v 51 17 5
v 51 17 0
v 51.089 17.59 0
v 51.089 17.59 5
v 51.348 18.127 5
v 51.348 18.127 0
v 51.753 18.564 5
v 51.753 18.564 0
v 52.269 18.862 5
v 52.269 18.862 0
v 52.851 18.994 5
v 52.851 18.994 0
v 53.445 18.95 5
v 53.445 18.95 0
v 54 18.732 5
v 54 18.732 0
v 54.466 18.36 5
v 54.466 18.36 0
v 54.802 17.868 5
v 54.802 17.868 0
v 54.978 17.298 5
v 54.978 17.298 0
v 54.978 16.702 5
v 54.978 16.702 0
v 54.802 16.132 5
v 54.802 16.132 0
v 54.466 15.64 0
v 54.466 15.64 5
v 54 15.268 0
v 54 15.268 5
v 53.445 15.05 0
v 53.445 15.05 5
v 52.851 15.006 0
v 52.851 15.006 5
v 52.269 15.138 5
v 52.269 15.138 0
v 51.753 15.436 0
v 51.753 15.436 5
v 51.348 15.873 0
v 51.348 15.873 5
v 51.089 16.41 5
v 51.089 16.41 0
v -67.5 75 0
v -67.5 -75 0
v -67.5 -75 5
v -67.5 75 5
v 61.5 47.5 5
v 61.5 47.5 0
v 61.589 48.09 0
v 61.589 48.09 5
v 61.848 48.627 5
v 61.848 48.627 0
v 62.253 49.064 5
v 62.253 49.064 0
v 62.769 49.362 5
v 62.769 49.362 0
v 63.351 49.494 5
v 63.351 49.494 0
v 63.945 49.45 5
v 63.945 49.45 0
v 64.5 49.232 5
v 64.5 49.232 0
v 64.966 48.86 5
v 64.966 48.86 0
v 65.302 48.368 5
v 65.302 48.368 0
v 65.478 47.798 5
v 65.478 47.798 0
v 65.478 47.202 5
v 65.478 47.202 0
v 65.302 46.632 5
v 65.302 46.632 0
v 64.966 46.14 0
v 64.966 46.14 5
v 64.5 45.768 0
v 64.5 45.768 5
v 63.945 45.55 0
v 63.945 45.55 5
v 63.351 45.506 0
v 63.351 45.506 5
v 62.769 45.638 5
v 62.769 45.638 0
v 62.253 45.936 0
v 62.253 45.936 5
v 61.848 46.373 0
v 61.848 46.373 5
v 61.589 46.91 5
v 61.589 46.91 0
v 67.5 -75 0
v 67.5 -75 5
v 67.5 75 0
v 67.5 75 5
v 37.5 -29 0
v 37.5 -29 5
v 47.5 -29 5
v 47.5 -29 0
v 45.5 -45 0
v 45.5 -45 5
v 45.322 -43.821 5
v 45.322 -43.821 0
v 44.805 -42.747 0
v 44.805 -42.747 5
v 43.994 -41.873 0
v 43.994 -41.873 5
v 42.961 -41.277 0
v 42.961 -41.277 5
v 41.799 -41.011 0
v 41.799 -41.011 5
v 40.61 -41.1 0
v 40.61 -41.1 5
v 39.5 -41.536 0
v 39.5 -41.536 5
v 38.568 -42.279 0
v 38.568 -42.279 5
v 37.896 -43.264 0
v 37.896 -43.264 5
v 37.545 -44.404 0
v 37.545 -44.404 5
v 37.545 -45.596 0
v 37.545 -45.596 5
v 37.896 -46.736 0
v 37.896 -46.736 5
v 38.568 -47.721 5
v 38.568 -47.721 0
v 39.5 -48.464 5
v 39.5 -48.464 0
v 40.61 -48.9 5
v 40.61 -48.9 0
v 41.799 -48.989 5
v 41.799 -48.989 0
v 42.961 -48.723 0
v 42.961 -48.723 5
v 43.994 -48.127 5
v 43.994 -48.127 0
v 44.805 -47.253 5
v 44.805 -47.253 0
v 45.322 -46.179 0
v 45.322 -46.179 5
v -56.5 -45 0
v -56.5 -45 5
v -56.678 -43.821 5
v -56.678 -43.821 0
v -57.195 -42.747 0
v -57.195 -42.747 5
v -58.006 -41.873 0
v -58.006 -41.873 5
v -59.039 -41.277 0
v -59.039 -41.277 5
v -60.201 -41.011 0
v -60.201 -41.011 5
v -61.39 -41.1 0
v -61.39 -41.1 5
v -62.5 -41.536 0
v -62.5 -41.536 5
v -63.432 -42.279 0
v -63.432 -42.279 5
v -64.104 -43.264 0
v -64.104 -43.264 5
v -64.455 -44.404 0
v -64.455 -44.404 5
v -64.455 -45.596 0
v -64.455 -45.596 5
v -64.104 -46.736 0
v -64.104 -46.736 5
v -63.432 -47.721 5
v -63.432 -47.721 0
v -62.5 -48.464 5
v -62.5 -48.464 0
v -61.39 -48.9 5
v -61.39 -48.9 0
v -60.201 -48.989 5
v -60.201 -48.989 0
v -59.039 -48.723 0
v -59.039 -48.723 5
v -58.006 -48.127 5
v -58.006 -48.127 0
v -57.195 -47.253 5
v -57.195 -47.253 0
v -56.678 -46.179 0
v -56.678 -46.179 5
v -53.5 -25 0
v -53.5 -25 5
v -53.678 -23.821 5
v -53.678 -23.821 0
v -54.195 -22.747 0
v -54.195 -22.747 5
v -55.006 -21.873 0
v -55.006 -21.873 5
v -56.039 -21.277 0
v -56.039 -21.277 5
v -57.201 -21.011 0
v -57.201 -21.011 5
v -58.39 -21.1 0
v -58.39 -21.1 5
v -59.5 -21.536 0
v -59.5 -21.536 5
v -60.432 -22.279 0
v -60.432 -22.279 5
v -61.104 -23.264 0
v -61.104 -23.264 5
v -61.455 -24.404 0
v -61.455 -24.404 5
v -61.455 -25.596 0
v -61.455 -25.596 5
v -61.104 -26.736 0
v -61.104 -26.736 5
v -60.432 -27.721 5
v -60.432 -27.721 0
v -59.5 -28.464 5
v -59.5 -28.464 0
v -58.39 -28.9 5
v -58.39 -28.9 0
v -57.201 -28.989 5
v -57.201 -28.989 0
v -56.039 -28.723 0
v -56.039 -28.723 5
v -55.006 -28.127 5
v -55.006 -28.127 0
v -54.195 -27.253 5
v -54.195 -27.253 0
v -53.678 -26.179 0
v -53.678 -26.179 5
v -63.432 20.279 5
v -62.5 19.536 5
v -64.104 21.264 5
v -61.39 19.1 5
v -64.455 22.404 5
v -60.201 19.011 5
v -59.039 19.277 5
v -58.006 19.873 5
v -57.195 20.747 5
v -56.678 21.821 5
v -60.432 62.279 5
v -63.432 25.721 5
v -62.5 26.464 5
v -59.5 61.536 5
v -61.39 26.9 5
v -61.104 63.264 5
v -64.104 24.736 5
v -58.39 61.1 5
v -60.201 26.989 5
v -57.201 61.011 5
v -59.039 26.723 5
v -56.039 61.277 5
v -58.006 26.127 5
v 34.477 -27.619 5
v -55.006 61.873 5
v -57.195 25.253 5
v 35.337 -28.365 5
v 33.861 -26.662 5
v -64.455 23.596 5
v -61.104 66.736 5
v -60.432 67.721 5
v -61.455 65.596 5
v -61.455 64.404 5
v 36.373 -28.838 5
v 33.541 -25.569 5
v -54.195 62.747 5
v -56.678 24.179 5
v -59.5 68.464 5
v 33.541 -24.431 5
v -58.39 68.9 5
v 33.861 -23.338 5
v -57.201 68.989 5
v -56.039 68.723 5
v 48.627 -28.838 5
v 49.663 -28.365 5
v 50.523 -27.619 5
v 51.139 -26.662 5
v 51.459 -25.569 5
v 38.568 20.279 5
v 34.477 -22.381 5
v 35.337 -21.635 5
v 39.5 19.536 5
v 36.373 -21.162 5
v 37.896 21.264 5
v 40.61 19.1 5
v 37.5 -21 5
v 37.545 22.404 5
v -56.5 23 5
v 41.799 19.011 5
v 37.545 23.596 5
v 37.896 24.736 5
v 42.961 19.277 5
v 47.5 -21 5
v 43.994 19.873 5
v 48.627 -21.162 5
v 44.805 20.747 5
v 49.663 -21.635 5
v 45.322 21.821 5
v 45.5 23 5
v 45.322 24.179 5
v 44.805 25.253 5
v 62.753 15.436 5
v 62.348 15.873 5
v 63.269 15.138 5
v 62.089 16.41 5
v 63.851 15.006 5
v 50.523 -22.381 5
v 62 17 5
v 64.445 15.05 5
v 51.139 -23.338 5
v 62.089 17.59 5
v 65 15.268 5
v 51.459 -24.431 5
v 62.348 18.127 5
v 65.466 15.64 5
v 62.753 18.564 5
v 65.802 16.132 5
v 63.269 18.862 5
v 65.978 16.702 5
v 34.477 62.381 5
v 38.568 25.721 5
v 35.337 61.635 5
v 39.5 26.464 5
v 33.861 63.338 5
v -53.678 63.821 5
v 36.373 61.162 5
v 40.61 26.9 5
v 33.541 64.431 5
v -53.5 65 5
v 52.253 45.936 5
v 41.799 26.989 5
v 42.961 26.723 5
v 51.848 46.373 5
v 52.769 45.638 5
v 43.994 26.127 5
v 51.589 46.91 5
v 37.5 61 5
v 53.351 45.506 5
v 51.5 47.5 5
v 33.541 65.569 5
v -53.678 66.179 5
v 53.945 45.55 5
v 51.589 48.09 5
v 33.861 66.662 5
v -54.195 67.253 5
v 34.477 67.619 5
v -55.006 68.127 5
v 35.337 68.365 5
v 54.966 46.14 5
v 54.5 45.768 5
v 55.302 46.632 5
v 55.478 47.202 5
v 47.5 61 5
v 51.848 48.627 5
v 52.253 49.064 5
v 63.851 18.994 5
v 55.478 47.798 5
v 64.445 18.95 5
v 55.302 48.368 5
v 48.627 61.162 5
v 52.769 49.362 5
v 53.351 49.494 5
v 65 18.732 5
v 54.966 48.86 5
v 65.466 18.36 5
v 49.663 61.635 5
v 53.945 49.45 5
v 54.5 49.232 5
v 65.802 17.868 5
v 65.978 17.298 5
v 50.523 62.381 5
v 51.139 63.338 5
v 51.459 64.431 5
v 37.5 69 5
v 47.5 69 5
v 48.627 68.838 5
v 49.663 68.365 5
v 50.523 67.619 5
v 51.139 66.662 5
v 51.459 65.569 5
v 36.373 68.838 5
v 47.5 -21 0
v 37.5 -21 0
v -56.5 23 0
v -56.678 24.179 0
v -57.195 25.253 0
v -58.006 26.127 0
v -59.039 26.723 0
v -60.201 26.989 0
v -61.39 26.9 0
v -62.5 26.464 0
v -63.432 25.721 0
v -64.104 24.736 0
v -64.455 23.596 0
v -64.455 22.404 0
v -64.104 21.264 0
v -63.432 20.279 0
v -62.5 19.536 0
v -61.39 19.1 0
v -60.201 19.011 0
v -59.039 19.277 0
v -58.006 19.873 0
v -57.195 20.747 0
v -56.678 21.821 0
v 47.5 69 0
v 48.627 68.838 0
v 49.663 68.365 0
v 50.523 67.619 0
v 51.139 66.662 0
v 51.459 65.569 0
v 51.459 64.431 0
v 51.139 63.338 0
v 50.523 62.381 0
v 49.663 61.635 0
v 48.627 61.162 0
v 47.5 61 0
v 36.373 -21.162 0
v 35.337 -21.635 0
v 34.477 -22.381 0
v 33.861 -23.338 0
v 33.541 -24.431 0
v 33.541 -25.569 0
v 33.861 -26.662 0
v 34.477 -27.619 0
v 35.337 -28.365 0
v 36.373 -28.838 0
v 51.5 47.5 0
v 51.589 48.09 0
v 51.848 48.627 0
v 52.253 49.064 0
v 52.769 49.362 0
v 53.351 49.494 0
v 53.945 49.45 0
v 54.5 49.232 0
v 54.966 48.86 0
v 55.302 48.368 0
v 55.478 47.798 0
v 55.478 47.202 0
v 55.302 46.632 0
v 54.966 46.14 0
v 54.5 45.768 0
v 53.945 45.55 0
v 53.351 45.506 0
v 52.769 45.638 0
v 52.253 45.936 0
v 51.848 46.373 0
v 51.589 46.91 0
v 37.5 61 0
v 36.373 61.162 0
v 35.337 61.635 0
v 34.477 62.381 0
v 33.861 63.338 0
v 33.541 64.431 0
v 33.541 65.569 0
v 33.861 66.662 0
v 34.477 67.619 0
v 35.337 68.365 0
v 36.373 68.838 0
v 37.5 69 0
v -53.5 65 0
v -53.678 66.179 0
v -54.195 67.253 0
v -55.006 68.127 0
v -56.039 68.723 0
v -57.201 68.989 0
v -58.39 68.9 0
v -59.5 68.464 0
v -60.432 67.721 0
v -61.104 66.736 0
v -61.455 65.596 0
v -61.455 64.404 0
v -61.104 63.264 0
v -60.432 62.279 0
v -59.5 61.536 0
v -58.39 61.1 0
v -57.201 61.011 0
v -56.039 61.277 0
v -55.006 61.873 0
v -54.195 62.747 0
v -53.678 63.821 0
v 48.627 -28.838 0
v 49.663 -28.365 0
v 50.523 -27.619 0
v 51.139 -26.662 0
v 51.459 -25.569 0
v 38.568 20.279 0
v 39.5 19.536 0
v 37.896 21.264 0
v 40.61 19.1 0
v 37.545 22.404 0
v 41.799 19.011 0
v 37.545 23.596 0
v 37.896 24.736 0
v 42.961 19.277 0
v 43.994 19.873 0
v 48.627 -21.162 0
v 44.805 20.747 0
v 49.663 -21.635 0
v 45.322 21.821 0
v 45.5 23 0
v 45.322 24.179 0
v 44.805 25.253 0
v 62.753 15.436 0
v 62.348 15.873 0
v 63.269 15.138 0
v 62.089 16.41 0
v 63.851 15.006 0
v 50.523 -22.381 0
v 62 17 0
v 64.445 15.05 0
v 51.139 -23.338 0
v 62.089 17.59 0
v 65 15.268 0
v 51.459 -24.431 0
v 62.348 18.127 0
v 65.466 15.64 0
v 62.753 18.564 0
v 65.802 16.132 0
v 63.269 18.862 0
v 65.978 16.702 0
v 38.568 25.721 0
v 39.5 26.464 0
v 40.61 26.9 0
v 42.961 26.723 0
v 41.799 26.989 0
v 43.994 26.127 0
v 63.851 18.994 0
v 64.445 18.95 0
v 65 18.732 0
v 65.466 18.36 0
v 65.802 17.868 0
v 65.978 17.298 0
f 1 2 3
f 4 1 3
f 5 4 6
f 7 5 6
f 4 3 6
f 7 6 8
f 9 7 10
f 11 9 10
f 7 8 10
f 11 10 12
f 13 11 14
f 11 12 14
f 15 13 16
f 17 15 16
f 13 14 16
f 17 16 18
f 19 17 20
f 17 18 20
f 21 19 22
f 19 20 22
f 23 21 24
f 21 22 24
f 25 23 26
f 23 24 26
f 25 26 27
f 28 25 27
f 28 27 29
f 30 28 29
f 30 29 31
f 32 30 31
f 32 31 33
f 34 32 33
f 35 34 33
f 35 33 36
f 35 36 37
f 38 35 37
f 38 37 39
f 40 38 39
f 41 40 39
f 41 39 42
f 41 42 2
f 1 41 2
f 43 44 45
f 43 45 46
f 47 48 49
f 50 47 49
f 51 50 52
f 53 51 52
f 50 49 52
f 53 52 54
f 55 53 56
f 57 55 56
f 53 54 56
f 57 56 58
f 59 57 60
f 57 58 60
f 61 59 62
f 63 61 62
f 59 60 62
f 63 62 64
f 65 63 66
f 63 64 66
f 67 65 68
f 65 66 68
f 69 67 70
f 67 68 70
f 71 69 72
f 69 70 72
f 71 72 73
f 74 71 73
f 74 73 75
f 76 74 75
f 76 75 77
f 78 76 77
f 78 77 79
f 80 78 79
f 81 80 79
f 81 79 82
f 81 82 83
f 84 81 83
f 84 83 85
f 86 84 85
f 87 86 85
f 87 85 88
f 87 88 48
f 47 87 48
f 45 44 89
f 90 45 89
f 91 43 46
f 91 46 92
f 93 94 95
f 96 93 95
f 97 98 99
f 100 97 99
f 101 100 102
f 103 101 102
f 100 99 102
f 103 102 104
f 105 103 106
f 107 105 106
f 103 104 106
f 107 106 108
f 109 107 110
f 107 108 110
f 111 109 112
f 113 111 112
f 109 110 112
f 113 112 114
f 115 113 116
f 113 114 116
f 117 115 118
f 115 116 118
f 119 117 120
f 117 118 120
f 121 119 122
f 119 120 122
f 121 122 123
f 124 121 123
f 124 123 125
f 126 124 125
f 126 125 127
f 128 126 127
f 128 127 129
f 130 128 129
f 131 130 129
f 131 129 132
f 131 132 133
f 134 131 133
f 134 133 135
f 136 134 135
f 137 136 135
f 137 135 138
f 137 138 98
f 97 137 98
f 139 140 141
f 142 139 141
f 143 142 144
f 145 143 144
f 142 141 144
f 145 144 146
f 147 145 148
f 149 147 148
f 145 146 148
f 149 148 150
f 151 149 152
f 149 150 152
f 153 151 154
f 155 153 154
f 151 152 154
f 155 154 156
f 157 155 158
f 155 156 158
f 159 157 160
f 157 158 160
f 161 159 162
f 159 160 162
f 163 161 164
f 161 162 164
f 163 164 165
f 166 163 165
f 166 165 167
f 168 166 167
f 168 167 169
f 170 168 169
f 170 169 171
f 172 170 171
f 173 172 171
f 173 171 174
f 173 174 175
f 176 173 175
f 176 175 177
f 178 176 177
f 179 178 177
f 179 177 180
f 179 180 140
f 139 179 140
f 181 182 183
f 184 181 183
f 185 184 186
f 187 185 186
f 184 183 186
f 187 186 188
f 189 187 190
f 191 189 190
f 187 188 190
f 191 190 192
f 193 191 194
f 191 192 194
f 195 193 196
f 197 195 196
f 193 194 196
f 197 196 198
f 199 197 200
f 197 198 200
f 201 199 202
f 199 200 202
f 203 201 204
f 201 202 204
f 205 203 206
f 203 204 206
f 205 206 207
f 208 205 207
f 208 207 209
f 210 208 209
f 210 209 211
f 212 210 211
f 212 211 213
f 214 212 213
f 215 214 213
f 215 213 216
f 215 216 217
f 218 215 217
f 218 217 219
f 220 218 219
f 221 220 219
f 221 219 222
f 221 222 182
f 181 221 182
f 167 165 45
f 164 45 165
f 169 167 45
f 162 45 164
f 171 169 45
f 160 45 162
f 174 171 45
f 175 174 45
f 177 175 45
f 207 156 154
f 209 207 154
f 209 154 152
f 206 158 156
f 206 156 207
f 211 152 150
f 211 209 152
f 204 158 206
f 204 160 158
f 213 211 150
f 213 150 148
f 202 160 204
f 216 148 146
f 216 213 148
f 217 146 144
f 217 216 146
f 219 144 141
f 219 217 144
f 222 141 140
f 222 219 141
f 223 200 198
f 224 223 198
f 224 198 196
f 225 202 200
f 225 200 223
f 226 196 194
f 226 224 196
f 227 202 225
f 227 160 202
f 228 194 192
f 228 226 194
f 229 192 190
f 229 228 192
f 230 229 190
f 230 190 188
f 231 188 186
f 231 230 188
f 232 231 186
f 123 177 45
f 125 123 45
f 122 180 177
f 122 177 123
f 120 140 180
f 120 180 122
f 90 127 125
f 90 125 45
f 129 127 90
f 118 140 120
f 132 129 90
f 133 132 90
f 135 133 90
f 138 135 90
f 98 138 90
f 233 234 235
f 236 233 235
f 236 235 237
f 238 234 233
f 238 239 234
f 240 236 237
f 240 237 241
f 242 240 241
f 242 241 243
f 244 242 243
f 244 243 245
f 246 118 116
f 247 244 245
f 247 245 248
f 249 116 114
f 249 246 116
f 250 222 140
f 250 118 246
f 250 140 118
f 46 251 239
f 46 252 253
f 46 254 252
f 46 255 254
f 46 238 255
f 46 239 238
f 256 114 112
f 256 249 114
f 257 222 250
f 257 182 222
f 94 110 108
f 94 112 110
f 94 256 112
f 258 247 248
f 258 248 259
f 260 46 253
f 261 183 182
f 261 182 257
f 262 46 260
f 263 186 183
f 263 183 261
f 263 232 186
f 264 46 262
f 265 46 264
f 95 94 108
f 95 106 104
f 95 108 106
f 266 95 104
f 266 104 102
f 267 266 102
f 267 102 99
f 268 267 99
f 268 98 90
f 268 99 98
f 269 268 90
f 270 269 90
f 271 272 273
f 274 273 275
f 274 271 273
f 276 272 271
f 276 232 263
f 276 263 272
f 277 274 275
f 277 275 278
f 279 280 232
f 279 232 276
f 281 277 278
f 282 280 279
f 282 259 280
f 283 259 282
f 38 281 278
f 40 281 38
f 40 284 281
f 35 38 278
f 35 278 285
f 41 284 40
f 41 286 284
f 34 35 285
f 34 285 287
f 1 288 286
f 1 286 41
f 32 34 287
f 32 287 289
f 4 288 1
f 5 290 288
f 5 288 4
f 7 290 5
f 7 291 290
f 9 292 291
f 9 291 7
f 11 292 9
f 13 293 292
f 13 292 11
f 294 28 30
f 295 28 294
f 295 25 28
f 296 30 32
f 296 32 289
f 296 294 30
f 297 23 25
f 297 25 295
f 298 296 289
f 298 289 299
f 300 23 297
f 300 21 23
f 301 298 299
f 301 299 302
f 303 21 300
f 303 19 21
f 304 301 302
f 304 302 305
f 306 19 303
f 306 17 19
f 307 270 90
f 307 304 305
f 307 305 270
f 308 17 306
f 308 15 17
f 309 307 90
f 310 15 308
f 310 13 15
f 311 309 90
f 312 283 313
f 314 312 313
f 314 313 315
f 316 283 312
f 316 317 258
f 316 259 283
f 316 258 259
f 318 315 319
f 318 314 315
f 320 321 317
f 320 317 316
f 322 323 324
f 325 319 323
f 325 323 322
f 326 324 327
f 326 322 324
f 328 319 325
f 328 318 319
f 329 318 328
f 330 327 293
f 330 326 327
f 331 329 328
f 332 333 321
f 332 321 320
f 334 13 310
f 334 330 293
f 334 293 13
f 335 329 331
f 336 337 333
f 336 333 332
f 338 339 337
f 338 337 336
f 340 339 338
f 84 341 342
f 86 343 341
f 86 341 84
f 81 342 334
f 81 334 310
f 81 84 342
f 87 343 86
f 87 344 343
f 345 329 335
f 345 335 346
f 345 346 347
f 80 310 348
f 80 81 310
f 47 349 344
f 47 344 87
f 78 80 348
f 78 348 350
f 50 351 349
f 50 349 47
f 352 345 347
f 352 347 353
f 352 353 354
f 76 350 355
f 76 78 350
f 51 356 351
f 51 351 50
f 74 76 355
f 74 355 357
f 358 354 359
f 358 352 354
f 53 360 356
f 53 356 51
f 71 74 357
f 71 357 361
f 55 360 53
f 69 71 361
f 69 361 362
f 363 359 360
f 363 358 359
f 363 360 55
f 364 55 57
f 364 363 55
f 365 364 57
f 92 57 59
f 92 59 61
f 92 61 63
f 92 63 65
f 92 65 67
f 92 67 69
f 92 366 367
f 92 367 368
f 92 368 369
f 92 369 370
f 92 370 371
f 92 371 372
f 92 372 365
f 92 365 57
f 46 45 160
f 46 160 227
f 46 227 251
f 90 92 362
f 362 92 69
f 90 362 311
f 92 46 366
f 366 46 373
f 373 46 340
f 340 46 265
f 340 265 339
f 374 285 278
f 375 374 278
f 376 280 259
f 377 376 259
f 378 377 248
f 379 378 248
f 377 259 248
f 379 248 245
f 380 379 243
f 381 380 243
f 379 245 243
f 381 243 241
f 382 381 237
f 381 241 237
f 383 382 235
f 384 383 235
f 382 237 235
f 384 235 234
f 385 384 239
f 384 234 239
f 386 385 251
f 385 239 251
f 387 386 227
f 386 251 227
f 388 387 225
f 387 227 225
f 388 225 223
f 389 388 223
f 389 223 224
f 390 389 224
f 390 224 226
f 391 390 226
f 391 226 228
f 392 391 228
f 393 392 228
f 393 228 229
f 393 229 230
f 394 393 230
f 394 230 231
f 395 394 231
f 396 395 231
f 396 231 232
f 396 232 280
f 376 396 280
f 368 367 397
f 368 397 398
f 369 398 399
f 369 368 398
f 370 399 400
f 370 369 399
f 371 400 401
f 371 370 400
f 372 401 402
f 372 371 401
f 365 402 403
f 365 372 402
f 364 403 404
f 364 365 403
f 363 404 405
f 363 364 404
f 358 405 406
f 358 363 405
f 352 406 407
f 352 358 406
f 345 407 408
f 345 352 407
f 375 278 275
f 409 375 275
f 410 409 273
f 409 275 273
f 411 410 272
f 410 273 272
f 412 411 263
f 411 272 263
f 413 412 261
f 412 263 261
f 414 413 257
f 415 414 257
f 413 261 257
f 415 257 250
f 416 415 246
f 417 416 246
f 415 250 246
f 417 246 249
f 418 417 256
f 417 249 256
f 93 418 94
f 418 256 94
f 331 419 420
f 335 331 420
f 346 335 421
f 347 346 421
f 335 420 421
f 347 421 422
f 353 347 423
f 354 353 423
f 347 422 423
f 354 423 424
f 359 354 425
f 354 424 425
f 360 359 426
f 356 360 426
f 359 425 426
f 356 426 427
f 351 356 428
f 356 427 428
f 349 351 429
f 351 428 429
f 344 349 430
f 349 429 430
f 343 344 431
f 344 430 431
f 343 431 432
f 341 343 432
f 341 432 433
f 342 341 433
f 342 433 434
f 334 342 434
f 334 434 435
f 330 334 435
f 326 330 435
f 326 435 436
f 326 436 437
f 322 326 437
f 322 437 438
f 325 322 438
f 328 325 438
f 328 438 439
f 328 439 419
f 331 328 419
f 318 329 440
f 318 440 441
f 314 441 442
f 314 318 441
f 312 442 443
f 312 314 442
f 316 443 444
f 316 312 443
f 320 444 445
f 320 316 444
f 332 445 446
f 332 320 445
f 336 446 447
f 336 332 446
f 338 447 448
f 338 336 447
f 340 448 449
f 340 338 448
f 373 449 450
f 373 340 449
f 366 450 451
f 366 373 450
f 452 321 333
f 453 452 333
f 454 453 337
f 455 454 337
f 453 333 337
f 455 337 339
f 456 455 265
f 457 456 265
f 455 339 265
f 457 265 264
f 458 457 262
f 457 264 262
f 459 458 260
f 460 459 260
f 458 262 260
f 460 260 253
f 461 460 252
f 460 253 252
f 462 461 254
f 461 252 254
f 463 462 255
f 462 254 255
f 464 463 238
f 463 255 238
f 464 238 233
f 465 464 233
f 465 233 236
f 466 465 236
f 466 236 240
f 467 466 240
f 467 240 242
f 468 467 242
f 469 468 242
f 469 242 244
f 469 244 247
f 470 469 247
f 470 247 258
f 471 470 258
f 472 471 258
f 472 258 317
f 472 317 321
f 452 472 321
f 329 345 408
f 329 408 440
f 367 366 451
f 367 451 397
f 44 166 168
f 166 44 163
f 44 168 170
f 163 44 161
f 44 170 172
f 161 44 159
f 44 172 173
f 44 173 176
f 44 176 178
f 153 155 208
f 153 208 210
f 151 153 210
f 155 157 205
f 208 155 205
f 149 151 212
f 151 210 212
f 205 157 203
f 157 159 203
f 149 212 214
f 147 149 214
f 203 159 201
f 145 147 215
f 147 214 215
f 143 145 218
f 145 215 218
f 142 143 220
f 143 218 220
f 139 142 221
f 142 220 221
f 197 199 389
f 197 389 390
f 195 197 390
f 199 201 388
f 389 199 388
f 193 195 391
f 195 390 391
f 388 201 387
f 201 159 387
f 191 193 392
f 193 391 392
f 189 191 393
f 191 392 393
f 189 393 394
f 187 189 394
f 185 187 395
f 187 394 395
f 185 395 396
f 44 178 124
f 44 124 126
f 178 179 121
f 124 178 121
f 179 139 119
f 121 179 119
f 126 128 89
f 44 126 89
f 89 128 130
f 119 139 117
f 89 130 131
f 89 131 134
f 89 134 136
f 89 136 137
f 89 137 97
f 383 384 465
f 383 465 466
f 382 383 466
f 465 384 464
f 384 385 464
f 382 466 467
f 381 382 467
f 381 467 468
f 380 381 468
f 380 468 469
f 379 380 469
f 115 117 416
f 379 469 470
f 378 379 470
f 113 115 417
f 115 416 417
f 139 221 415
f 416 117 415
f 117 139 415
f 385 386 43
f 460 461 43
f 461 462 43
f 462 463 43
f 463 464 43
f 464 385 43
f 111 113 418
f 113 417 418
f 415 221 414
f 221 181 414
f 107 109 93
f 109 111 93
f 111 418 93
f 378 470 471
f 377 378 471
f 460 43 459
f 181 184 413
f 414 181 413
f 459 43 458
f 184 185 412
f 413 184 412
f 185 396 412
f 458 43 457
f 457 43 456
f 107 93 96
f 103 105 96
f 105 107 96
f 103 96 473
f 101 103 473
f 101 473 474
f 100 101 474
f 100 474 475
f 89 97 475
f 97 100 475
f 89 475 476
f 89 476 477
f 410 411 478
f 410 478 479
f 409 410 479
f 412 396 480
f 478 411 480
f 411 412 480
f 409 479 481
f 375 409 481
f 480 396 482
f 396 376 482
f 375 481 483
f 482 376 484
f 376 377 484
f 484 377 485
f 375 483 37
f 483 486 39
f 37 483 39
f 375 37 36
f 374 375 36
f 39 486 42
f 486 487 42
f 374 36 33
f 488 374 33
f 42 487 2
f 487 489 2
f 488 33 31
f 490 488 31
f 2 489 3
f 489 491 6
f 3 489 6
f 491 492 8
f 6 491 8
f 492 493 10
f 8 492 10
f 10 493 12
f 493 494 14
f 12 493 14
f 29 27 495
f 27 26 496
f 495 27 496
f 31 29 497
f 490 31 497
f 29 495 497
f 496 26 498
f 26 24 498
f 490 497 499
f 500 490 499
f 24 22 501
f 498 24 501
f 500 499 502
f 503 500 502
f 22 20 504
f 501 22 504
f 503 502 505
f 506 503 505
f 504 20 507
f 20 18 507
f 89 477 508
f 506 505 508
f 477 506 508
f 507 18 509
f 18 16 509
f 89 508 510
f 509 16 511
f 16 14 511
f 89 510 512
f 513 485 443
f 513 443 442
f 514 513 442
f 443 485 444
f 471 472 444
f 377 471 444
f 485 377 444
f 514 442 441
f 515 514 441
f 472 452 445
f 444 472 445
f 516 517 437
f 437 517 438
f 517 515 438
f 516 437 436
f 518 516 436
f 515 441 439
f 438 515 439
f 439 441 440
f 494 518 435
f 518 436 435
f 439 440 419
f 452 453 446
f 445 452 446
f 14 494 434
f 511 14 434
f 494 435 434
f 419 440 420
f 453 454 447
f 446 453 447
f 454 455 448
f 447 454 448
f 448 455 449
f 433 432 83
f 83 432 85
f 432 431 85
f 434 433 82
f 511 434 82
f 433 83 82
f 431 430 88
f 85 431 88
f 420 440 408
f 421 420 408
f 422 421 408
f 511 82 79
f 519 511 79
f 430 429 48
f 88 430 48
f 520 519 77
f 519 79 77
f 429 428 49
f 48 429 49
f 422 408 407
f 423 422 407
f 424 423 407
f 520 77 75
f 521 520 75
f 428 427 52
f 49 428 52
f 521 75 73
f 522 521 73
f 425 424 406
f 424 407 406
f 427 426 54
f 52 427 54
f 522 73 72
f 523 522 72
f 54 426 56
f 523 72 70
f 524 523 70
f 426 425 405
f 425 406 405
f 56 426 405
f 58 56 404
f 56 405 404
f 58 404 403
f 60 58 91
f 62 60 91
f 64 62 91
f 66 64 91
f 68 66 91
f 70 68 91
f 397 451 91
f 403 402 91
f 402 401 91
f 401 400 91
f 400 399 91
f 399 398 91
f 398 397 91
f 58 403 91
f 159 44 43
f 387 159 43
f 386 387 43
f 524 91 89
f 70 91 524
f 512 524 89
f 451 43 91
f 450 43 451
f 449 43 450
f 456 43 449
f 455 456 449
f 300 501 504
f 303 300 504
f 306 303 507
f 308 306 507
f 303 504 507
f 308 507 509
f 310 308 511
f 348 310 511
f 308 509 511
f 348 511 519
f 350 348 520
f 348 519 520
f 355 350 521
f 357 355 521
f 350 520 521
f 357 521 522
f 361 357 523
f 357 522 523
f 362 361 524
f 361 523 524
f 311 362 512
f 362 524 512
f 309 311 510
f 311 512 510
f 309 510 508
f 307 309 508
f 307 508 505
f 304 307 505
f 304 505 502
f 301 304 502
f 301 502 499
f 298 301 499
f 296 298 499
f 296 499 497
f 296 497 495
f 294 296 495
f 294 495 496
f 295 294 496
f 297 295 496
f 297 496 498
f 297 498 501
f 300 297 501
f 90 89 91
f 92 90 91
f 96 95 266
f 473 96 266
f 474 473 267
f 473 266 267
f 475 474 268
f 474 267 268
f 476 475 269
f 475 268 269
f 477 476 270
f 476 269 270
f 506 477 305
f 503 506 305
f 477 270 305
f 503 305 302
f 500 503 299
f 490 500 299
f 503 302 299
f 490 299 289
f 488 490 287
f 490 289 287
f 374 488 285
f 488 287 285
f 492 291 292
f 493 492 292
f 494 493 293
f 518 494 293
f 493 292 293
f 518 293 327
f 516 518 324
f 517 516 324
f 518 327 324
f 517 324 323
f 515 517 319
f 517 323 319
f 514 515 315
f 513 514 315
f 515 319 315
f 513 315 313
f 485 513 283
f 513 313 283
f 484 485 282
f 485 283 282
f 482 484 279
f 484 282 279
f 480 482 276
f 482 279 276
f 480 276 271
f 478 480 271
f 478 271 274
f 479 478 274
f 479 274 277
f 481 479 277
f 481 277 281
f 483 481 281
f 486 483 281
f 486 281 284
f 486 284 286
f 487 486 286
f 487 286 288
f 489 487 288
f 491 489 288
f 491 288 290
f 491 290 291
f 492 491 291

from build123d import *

# Parameters (mm, degrees)
SKETCH1_W           = 135
SKETCH1_H           = 150
BOSS_EXTRUDE1_DEPTH = 5
CUT_EXTRUDE1_REACH  = 103.026
SKETCH2_R           = 4
CUT_EXTRUDE5_REACH  = 103.026
SKETCH6_R           = 4
CUT_EXTRUDE6_REACH  = 103.026
SKETCH7_R           = 2


with BuildPart() as part:
    # Sketch1 → Boss-Extrude1 (new body)
    with BuildSketch(Plane.XY):
        Rectangle(SKETCH1_W, SKETCH1_H)
    extrude(amount=BOSS_EXTRUDE1_DEPTH)

    # Sketch2 → Cut-Extrude1 (cut, up to next)
    with BuildSketch(Plane.XY.offset(5), mode=Mode.PRIVATE) as cut_extrude1_sk1:
        with Locations((-57.5, 65)):
            Circle(SKETCH2_R)
    cut_extrude1_tool1 = extrude(cut_extrude1_sk1.sketch, amount=-CUT_EXTRUDE1_REACH, mode=Mode.PRIVATE) & part.part
    # Sketch2 → Cut-Extrude1 (cut, up to next)
    with BuildSketch(Plane.XY.offset(5), mode=Mode.PRIVATE) as cut_extrude1_sk2:
        with Locations((-57.5, -25)):
            Circle(SKETCH2_R)
    cut_extrude1_tool2 = extrude(cut_extrude1_sk2.sketch, amount=-CUT_EXTRUDE1_REACH, mode=Mode.PRIVATE) & part.part
    # Sketch2 → Cut-Extrude1 (cut, up to next)
    with BuildSketch(Plane.XY.offset(5), mode=Mode.PRIVATE) as cut_extrude1_sk3:
        with BuildLine():
            Line((37.5, 69), (47.5, 69))
            ThreePointArc((47.5, 69), (51.5, 65), (47.5, 61))
            Line((47.5, 61), (37.5, 61))
            ThreePointArc((37.5, 61), (33.5, 65), (37.5, 69))
        make_face()
    cut_extrude1_tool3 = extrude(cut_extrude1_sk3.sketch, amount=-CUT_EXTRUDE1_REACH, mode=Mode.PRIVATE) & part.part
    # Sketch2 → Cut-Extrude1 (cut, up to next)
    with BuildSketch(Plane.XY.offset(5), mode=Mode.PRIVATE) as cut_extrude1_sk4:
        with BuildLine():
            Line((37.5, -29), (47.5, -29))
            ThreePointArc((47.5, -29), (51.5, -25), (47.5, -21))
            Line((47.5, -21), (37.5, -21))
            ThreePointArc((37.5, -21), (33.5, -25), (37.5, -29))
        make_face()
    cut_extrude1_tool4 = extrude(cut_extrude1_sk4.sketch, amount=-CUT_EXTRUDE1_REACH, mode=Mode.PRIVATE) & part.part
    add(cut_extrude1_tool1.solids().sort_by_distance((-57.5, 65, 5))[0], mode=Mode.SUBTRACT)
    add(cut_extrude1_tool2.solids().sort_by_distance((-57.5, -25, 5))[0], mode=Mode.SUBTRACT)
    add(cut_extrude1_tool3.solids().sort_by_distance((42.5, 65, 5))[0], mode=Mode.SUBTRACT)
    add(cut_extrude1_tool4.solids().sort_by_distance((42.5, -25, 5))[0], mode=Mode.SUBTRACT)

    # Sketch6 → Cut-Extrude5 (cut, up to next)
    with BuildSketch(Plane.XY.offset(5), mode=Mode.PRIVATE) as cut_extrude5_sk1:
        with Locations((-60.5, 23)):
            Circle(SKETCH6_R)
    cut_extrude5_tool1 = extrude(cut_extrude5_sk1.sketch, amount=-CUT_EXTRUDE5_REACH, mode=Mode.PRIVATE) & part.part
    # Sketch6 → Cut-Extrude5 (cut, up to next)
    with BuildSketch(Plane.XY.offset(5), mode=Mode.PRIVATE) as cut_extrude5_sk2:
        with Locations((-60.5, -45)):
            Circle(SKETCH6_R)
    cut_extrude5_tool2 = extrude(cut_extrude5_sk2.sketch, amount=-CUT_EXTRUDE5_REACH, mode=Mode.PRIVATE) & part.part
    # Sketch6 → Cut-Extrude5 (cut, up to next)
    with BuildSketch(Plane.XY.offset(5), mode=Mode.PRIVATE) as cut_extrude5_sk3:
        with Locations((41.5, 23)):
            Circle(SKETCH6_R)
    cut_extrude5_tool3 = extrude(cut_extrude5_sk3.sketch, amount=-CUT_EXTRUDE5_REACH, mode=Mode.PRIVATE) & part.part
    # Sketch6 → Cut-Extrude5 (cut, up to next)
    with BuildSketch(Plane.XY.offset(5), mode=Mode.PRIVATE) as cut_extrude5_sk4:
        with Locations((41.5, -45)):
            Circle(SKETCH6_R)
    cut_extrude5_tool4 = extrude(cut_extrude5_sk4.sketch, amount=-CUT_EXTRUDE5_REACH, mode=Mode.PRIVATE) & part.part
    add(cut_extrude5_tool1.solids().sort_by_distance((-60.5, 23, 5))[0], mode=Mode.SUBTRACT)
    add(cut_extrude5_tool2.solids().sort_by_distance((-60.5, -45, 5))[0], mode=Mode.SUBTRACT)
    add(cut_extrude5_tool3.solids().sort_by_distance((41.5, 23, 5))[0], mode=Mode.SUBTRACT)
    add(cut_extrude5_tool4.solids().sort_by_distance((41.5, -45, 5))[0], mode=Mode.SUBTRACT)

    # Sketch7 → Cut-Extrude6 (cut, up to next)
    with BuildSketch(Plane(origin=(0, 0, 0), x_dir=(-1, 0, 0), z_dir=(0, 0, -1)), mode=Mode.PRIVATE) as cut_extrude6_sk1:
        with Locations((-63.5, 47.5)):
            Circle(SKETCH7_R)
    cut_extrude6_tool1 = extrude(cut_extrude6_sk1.sketch, amount=-CUT_EXTRUDE6_REACH, mode=Mode.PRIVATE) & part.part
    # Sketch7 → Cut-Extrude6 (cut, up to next)
    with BuildSketch(Plane(origin=(0, 0, 0), x_dir=(-1, 0, 0), z_dir=(0, 0, -1)), mode=Mode.PRIVATE) as cut_extrude6_sk2:
        with Locations((-53.5, 47.5)):
            Circle(SKETCH7_R)
    cut_extrude6_tool2 = extrude(cut_extrude6_sk2.sketch, amount=-CUT_EXTRUDE6_REACH, mode=Mode.PRIVATE) & part.part
    # Sketch7 → Cut-Extrude6 (cut, up to next)
    with BuildSketch(Plane(origin=(0, 0, 0), x_dir=(-1, 0, 0), z_dir=(0, 0, -1)), mode=Mode.PRIVATE) as cut_extrude6_sk3:
        with Locations((-64, 17)):
            Circle(SKETCH7_R)
    cut_extrude6_tool3 = extrude(cut_extrude6_sk3.sketch, amount=-CUT_EXTRUDE6_REACH, mode=Mode.PRIVATE) & part.part
    # Sketch7 → Cut-Extrude6 (cut, up to next)
    with BuildSketch(Plane(origin=(0, 0, 0), x_dir=(-1, 0, 0), z_dir=(0, 0, -1)), mode=Mode.PRIVATE) as cut_extrude6_sk4:
        with Locations((-53, 17)):
            Circle(SKETCH7_R)
    cut_extrude6_tool4 = extrude(cut_extrude6_sk4.sketch, amount=-CUT_EXTRUDE6_REACH, mode=Mode.PRIVATE) & part.part
    add(cut_extrude6_tool1.solids().sort_by_distance((63.5, 47.5, 0))[0], mode=Mode.SUBTRACT)
    add(cut_extrude6_tool2.solids().sort_by_distance((53.5, 47.5, 0))[0], mode=Mode.SUBTRACT)
    add(cut_extrude6_tool3.solids().sort_by_distance((64, 17, 0))[0], mode=Mode.SUBTRACT)
    add(cut_extrude6_tool4.solids().sort_by_distance((53, 17, 0))[0], mode=Mode.SUBTRACT)


solid = part.part
